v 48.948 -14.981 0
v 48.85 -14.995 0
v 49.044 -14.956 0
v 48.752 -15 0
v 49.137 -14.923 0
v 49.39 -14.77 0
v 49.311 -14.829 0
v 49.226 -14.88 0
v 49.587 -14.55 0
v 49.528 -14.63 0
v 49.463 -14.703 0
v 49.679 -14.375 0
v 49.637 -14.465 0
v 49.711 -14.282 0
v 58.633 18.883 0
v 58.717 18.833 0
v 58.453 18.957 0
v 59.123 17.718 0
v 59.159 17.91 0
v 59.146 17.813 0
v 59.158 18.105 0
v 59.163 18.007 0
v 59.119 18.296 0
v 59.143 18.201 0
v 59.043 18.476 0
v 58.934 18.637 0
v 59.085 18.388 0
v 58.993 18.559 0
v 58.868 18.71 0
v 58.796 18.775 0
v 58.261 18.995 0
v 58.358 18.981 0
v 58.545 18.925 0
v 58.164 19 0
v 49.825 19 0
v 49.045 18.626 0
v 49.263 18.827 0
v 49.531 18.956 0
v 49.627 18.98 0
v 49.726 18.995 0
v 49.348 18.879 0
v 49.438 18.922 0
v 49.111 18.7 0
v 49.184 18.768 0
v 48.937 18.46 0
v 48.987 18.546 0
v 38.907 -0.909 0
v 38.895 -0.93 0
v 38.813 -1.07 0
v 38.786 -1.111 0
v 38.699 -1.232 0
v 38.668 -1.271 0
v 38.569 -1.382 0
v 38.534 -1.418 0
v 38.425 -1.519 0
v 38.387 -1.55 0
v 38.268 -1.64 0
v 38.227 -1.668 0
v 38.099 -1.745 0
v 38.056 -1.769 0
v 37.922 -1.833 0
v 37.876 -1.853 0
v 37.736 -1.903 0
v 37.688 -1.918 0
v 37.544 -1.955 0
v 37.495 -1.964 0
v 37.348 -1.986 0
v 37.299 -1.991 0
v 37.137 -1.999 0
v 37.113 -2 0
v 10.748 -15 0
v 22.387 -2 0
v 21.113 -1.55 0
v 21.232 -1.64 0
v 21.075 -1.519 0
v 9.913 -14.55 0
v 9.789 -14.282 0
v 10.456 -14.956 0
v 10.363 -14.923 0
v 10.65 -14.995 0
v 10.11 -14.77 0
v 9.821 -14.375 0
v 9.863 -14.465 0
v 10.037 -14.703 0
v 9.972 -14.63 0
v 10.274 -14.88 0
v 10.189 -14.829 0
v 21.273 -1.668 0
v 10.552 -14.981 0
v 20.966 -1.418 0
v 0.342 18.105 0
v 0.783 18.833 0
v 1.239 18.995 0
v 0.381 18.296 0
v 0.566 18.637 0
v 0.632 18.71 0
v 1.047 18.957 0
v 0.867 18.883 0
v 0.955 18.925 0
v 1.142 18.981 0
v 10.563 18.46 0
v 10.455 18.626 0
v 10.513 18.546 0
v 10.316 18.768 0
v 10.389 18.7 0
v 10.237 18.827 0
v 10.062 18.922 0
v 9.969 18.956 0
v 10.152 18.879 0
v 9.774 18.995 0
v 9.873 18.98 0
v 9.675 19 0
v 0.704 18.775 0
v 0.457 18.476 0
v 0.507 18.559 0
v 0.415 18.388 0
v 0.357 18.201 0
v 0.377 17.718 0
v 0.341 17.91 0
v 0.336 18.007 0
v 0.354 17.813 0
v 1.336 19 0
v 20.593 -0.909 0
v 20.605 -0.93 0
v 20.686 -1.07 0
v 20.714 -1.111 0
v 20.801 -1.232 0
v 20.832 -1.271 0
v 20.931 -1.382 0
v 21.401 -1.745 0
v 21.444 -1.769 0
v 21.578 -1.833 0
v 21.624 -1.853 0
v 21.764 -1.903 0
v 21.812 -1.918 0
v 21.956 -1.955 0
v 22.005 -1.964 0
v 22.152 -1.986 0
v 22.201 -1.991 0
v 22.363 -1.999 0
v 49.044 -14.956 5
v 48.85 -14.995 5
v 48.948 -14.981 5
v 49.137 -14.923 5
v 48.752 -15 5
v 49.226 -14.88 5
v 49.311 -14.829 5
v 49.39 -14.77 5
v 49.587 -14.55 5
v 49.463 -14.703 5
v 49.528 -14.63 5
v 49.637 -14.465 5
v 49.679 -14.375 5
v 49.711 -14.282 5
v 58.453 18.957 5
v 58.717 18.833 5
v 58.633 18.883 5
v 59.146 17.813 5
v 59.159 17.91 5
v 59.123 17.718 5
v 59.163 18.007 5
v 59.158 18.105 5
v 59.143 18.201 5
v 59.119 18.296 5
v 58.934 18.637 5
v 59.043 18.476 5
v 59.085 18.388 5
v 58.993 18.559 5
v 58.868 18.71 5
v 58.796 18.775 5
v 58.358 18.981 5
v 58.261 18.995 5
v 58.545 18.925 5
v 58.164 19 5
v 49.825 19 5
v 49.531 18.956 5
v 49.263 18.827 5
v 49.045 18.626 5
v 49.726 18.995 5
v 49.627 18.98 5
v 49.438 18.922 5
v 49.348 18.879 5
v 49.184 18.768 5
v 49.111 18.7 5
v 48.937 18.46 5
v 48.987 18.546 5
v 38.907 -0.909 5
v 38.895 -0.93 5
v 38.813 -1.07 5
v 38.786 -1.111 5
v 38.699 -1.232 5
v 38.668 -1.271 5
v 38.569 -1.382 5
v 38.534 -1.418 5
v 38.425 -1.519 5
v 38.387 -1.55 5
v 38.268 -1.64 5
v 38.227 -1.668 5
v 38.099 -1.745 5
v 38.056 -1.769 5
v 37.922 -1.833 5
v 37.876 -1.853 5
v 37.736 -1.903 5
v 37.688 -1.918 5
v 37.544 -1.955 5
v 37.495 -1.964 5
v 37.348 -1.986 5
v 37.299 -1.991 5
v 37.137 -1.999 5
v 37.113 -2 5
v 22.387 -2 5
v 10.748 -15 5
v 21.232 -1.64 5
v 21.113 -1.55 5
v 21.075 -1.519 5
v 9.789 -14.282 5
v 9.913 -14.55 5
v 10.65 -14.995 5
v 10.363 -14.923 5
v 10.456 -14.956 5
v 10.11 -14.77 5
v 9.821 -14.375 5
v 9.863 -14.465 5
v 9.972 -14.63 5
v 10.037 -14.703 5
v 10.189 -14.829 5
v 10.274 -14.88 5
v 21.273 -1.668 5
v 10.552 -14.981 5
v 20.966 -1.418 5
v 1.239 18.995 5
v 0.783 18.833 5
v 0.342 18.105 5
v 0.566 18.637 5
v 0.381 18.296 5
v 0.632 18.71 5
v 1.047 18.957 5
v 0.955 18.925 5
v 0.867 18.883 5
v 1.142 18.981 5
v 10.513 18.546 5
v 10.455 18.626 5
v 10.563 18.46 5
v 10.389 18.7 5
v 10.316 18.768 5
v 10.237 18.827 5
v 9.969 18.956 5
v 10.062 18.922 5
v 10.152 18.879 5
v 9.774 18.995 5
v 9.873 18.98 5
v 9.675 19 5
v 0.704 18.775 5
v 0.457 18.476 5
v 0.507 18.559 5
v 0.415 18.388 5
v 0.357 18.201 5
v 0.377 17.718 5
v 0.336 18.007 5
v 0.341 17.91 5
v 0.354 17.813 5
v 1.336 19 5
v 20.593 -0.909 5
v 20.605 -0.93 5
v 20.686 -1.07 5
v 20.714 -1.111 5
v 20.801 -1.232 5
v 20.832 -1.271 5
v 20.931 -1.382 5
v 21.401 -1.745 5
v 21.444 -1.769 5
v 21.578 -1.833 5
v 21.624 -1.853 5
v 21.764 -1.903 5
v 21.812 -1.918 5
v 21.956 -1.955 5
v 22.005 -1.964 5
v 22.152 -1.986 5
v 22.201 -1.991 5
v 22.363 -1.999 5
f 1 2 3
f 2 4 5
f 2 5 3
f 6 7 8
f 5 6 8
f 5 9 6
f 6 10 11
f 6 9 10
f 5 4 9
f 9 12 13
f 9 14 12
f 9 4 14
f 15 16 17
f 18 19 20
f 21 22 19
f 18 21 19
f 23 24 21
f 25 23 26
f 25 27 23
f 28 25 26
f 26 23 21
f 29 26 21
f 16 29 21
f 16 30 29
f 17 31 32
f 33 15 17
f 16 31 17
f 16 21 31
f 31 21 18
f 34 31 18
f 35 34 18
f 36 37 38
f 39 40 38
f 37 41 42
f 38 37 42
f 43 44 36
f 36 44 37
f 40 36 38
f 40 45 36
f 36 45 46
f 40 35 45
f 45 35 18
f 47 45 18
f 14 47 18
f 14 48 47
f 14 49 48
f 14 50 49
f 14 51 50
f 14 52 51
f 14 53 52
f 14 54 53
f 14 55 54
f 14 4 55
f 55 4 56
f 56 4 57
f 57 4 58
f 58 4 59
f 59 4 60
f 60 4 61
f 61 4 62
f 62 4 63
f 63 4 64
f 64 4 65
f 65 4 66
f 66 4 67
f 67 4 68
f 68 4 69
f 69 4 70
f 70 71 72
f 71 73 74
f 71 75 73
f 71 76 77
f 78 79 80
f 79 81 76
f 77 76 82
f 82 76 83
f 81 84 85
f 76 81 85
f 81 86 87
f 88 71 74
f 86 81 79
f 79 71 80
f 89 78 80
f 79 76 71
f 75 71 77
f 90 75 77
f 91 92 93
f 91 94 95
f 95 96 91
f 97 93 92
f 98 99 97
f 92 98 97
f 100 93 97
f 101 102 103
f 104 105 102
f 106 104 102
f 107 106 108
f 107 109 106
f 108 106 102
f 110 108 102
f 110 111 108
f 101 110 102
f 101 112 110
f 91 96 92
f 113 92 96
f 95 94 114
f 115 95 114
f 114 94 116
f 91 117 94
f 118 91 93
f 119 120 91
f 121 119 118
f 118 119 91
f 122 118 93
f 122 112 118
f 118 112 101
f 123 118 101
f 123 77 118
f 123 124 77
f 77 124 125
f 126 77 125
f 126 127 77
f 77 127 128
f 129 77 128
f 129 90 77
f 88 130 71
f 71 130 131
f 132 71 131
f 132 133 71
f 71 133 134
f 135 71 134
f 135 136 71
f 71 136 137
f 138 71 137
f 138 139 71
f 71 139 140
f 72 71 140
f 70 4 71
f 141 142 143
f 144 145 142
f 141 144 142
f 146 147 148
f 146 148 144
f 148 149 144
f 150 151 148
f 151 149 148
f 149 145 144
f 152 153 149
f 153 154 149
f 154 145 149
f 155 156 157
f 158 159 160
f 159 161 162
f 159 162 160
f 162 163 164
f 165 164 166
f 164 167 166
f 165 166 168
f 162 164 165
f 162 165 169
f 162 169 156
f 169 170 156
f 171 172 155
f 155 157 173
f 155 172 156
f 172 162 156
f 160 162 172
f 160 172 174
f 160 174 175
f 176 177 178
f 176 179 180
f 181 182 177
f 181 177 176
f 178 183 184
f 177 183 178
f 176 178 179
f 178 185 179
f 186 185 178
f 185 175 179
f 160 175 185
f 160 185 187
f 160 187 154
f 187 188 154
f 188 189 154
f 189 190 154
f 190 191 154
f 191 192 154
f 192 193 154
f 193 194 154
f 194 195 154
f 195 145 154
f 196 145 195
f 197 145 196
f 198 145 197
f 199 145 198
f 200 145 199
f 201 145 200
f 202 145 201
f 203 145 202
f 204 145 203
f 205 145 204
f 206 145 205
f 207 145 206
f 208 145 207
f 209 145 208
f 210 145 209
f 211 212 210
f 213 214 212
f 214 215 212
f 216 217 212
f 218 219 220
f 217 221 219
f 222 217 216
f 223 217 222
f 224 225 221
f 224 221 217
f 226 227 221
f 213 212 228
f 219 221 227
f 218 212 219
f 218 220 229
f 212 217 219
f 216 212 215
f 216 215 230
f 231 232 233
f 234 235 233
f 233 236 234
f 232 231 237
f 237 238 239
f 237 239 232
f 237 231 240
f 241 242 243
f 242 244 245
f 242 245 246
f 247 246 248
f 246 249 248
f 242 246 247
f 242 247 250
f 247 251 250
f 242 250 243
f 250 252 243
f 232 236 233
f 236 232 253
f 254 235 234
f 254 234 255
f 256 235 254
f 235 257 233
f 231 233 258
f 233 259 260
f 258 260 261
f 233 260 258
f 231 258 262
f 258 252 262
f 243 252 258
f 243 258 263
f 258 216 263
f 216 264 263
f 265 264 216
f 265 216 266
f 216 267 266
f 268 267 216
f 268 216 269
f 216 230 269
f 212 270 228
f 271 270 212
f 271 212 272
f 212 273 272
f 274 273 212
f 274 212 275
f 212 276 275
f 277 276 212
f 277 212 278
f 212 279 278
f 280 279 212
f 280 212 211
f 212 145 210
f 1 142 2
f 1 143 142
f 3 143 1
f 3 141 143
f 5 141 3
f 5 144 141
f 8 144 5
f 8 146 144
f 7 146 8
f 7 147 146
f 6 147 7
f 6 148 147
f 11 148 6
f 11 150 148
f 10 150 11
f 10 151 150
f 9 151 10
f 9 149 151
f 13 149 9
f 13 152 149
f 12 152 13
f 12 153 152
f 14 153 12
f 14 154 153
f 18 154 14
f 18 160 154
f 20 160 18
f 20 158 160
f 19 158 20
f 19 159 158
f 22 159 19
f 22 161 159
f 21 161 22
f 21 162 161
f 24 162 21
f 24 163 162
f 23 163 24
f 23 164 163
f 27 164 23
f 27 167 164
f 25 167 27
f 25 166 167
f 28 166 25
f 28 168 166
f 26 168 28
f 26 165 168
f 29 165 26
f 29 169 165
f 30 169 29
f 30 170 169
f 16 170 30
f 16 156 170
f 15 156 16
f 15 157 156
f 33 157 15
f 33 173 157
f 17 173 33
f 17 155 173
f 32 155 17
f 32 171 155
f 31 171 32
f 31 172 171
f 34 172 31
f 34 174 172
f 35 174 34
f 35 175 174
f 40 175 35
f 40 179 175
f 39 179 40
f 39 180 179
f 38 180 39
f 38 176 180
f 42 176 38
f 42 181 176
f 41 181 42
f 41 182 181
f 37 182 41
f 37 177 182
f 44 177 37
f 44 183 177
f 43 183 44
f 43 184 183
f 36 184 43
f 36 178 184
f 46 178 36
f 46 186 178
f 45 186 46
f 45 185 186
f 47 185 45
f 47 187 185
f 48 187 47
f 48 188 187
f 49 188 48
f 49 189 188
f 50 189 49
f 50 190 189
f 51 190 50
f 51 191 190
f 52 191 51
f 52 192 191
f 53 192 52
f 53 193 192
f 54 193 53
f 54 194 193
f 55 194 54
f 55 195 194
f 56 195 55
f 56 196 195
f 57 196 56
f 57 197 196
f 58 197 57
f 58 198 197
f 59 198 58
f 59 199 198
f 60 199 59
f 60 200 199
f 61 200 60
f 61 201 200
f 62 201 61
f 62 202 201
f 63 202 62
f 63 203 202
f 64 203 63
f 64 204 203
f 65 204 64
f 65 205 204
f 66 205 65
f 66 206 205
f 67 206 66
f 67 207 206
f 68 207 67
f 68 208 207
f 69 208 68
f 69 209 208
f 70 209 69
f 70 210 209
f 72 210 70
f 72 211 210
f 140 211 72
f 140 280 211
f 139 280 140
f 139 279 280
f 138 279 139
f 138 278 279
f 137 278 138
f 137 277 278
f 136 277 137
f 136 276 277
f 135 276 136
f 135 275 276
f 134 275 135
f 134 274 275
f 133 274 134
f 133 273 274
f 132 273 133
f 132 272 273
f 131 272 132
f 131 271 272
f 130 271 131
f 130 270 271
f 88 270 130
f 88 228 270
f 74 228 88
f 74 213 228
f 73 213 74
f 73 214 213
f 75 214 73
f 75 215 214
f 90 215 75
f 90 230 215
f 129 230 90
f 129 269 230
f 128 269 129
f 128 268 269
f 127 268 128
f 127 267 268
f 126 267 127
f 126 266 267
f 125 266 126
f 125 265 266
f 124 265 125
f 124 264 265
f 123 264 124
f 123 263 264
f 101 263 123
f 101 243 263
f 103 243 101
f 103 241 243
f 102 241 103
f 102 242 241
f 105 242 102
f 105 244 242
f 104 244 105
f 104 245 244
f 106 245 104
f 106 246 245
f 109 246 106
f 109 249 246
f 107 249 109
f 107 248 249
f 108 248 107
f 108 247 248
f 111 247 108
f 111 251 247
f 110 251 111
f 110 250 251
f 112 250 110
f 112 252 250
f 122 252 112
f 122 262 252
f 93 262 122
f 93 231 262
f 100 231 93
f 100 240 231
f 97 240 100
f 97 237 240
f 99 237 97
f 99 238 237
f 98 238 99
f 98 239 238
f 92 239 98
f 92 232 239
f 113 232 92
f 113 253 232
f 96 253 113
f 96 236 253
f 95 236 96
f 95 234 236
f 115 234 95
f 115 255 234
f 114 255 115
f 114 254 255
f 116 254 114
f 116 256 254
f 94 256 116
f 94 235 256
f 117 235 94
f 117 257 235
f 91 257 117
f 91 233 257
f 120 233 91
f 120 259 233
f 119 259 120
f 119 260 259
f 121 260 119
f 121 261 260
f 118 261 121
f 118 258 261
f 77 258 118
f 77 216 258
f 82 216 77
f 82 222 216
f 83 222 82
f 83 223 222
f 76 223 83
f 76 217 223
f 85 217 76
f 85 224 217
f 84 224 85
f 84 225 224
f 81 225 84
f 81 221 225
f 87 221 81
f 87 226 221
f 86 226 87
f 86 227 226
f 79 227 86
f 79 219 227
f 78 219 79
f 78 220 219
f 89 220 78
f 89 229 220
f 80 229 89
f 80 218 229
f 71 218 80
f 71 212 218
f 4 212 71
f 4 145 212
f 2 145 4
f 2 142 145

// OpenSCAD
union() {
	linear_extrude(height = 5) {
		polygon(points = [[9.6751717803, 19.0000000000], [9.7743688507, 18.9950678073], [9.8725874031, 18.9803198824], [9.9688585717, 18.9559017044], [10.0622327006, 18.9220541437], [10.1517887114, 18.8791110857], [10.2366431892, 18.8274961371], [10.3159590967, 18.7677184478], [10.3889540311, 18.7003676880], [10.4549079425, 18.6261082314], [10.5131702358, 18.5456726019], [10.5631661895, 18.4598542477], [20.5932994704, -0.9086789844], [20.6052635687, -0.9304407554], [20.6864963850, -1.0698773717], [20.7135776533, -1.1114665241], [20.8009531112, -1.2320951424], [20.8320263316, -1.2707927867], [20.9309368423, -1.3821590520], [20.9656954966, -1.4175834596], [21.0751653689, -1.5185888120], [21.1132665842, -1.5503905430], [21.2322159651, -1.6400386270], [21.2732838965, -1.6679039767], [21.4005394234, -1.7453104689], [21.4441689608, -1.7689645629], [21.5784753363, -1.8333658959], [21.6242361013, -1.8525754011], [21.7642684754, -1.9033362953], [21.8117090661, -1.9179117216], [21.9560861055, -1.9545314521], [22.0047385497, -1.9643290220], [22.1520360638, -1.9864463575], [22.2014204349, -1.9913694240], [22.3625946262, -1.9993831905], [22.3874206986, -2.0000000000], [37.1125793014, -2.0000000000], [37.1374053738, -1.9993831905], [37.2985795651, -1.9913694240], [37.3479639362, -1.9864463575], [37.4952614503, -1.9643290220], [37.5439138945, -1.9545314521], [37.6882909339, -1.9179117216], [37.7357315246, -1.9033362953], [37.8757638987, -1.8525754011], [37.9215246637, -1.8333658959], [38.0558310392, -1.7689645629], [38.0994605766, -1.7453104689], [38.2267161035, -1.6679039767], [38.2677840349, -1.6400386270], [38.3867334158, -1.5503905430], [38.4248346311, -1.5185888120], [38.5343045034, -1.4175834596], [38.5690631577, -1.3821590520], [38.6679736684, -1.2707927867], [38.6990468888, -1.2320951424], [38.7864223467, -1.1114665241], [38.8135036150, -1.0698773717], [38.8947364313, -0.9304407554], [38.9067005296, -0.9086789844], [48.9368338105, 18.4598542477], [48.9868297642, 18.5456726019], [49.0450920575, 18.6261082314], [49.1110459689, 18.7003676880], [49.1840409033, 18.7677184478], [49.2633568108, 18.8274961371], [49.3482112886, 18.8791110857], [49.4377672994, 18.9220541437], [49.5311414283, 18.9559017044], [49.6274125969, 18.9803198824], [49.7256311493, 18.9950678073], [49.8248282197, 19.0000000000], [58.1635267561, 19.0000000000], [58.2611000935, 18.9952283375], [58.3577422569, 18.9809588876], [58.4525309586, 18.9573278284], [58.5445615993, 18.9245606785], [58.6329559007, 18.8829701457], [58.7168702872, 18.8329531419], [58.7955039366, 18.7749869956], [58.8681064224, 18.7096248965], [58.9339848756, 18.6374906165], [58.9925105965, 18.5592725564], [59.0431250553, 18.4757171766], [59.0853452217, 18.3876218731], [59.1187681749, 18.2958273682], [59.1430749489, 18.2012096866], [59.1580335762, 18.1046717955], [59.1635013017, 18.0071349875], [59.1594259453, 17.9095300880], [59.1458463992, 17.8127885723], [59.1228922576, 17.7178336760], [49.7111275518, -14.2821663240], [49.6786063049, -14.3754460380], [49.6370402292, -14.4650618730], [49.5868349570, -14.5501392917], [49.5284804283, -14.6298480460], [49.4625461096, -14.7034102792], [49.3896754365, -14.7701081168], [49.3105795347, -14.8292906722], [49.2260302804, -14.8803803984], [49.1368527673, -14.9228787242], [49.0439172554, -14.9563709197], [48.9481306778, -14.9805301434], [48.8504277905, -14.9951206317], [48.7517620502, -15.0000000000], [10.7482379498, -15.0000000000], [10.6495722095, -14.9951206317], [10.5518693222, -14.9805301434], [10.4560827446, -14.9563709197], [10.3631472327, -14.9228787242], [10.2739697196, -14.8803803984], [10.1894204653, -14.8292906722], [10.1103245635, -14.7701081168], [10.0374538904, -14.7034102792], [9.9715195717, -14.6298480460], [9.9131650430, -14.5501392917], [9.8629597708, -14.4650618730], [9.8213936951, -14.3754460380], [9.7888724482, -14.2821663240], [0.3771077424, 17.7178336760], [0.3541536008, 17.8127885723], [0.3405740547, 17.9095300880], [0.3364986983, 18.0071349875], [0.3419664238, 18.1046717955], [0.3569250511, 18.2012096866], [0.3812318251, 18.2958273682], [0.4146547783, 18.3876218731], [0.4568749447, 18.4757171766], [0.5074894035, 18.5592725564], [0.5660151244, 18.6374906165], [0.6318935776, 18.7096248965], [0.7044960634, 18.7749869956], [0.7831297128, 18.8329531419], [0.8670440993, 18.8829701457], [0.9554384007, 18.9245606785], [1.0474690414, 18.9573278284], [1.1422577431, 18.9809588876], [1.2388999065, 18.9952283375], [1.3364732439, 19.0000000000], [9.6751717803, 19.0000000000]]);
	}
}
